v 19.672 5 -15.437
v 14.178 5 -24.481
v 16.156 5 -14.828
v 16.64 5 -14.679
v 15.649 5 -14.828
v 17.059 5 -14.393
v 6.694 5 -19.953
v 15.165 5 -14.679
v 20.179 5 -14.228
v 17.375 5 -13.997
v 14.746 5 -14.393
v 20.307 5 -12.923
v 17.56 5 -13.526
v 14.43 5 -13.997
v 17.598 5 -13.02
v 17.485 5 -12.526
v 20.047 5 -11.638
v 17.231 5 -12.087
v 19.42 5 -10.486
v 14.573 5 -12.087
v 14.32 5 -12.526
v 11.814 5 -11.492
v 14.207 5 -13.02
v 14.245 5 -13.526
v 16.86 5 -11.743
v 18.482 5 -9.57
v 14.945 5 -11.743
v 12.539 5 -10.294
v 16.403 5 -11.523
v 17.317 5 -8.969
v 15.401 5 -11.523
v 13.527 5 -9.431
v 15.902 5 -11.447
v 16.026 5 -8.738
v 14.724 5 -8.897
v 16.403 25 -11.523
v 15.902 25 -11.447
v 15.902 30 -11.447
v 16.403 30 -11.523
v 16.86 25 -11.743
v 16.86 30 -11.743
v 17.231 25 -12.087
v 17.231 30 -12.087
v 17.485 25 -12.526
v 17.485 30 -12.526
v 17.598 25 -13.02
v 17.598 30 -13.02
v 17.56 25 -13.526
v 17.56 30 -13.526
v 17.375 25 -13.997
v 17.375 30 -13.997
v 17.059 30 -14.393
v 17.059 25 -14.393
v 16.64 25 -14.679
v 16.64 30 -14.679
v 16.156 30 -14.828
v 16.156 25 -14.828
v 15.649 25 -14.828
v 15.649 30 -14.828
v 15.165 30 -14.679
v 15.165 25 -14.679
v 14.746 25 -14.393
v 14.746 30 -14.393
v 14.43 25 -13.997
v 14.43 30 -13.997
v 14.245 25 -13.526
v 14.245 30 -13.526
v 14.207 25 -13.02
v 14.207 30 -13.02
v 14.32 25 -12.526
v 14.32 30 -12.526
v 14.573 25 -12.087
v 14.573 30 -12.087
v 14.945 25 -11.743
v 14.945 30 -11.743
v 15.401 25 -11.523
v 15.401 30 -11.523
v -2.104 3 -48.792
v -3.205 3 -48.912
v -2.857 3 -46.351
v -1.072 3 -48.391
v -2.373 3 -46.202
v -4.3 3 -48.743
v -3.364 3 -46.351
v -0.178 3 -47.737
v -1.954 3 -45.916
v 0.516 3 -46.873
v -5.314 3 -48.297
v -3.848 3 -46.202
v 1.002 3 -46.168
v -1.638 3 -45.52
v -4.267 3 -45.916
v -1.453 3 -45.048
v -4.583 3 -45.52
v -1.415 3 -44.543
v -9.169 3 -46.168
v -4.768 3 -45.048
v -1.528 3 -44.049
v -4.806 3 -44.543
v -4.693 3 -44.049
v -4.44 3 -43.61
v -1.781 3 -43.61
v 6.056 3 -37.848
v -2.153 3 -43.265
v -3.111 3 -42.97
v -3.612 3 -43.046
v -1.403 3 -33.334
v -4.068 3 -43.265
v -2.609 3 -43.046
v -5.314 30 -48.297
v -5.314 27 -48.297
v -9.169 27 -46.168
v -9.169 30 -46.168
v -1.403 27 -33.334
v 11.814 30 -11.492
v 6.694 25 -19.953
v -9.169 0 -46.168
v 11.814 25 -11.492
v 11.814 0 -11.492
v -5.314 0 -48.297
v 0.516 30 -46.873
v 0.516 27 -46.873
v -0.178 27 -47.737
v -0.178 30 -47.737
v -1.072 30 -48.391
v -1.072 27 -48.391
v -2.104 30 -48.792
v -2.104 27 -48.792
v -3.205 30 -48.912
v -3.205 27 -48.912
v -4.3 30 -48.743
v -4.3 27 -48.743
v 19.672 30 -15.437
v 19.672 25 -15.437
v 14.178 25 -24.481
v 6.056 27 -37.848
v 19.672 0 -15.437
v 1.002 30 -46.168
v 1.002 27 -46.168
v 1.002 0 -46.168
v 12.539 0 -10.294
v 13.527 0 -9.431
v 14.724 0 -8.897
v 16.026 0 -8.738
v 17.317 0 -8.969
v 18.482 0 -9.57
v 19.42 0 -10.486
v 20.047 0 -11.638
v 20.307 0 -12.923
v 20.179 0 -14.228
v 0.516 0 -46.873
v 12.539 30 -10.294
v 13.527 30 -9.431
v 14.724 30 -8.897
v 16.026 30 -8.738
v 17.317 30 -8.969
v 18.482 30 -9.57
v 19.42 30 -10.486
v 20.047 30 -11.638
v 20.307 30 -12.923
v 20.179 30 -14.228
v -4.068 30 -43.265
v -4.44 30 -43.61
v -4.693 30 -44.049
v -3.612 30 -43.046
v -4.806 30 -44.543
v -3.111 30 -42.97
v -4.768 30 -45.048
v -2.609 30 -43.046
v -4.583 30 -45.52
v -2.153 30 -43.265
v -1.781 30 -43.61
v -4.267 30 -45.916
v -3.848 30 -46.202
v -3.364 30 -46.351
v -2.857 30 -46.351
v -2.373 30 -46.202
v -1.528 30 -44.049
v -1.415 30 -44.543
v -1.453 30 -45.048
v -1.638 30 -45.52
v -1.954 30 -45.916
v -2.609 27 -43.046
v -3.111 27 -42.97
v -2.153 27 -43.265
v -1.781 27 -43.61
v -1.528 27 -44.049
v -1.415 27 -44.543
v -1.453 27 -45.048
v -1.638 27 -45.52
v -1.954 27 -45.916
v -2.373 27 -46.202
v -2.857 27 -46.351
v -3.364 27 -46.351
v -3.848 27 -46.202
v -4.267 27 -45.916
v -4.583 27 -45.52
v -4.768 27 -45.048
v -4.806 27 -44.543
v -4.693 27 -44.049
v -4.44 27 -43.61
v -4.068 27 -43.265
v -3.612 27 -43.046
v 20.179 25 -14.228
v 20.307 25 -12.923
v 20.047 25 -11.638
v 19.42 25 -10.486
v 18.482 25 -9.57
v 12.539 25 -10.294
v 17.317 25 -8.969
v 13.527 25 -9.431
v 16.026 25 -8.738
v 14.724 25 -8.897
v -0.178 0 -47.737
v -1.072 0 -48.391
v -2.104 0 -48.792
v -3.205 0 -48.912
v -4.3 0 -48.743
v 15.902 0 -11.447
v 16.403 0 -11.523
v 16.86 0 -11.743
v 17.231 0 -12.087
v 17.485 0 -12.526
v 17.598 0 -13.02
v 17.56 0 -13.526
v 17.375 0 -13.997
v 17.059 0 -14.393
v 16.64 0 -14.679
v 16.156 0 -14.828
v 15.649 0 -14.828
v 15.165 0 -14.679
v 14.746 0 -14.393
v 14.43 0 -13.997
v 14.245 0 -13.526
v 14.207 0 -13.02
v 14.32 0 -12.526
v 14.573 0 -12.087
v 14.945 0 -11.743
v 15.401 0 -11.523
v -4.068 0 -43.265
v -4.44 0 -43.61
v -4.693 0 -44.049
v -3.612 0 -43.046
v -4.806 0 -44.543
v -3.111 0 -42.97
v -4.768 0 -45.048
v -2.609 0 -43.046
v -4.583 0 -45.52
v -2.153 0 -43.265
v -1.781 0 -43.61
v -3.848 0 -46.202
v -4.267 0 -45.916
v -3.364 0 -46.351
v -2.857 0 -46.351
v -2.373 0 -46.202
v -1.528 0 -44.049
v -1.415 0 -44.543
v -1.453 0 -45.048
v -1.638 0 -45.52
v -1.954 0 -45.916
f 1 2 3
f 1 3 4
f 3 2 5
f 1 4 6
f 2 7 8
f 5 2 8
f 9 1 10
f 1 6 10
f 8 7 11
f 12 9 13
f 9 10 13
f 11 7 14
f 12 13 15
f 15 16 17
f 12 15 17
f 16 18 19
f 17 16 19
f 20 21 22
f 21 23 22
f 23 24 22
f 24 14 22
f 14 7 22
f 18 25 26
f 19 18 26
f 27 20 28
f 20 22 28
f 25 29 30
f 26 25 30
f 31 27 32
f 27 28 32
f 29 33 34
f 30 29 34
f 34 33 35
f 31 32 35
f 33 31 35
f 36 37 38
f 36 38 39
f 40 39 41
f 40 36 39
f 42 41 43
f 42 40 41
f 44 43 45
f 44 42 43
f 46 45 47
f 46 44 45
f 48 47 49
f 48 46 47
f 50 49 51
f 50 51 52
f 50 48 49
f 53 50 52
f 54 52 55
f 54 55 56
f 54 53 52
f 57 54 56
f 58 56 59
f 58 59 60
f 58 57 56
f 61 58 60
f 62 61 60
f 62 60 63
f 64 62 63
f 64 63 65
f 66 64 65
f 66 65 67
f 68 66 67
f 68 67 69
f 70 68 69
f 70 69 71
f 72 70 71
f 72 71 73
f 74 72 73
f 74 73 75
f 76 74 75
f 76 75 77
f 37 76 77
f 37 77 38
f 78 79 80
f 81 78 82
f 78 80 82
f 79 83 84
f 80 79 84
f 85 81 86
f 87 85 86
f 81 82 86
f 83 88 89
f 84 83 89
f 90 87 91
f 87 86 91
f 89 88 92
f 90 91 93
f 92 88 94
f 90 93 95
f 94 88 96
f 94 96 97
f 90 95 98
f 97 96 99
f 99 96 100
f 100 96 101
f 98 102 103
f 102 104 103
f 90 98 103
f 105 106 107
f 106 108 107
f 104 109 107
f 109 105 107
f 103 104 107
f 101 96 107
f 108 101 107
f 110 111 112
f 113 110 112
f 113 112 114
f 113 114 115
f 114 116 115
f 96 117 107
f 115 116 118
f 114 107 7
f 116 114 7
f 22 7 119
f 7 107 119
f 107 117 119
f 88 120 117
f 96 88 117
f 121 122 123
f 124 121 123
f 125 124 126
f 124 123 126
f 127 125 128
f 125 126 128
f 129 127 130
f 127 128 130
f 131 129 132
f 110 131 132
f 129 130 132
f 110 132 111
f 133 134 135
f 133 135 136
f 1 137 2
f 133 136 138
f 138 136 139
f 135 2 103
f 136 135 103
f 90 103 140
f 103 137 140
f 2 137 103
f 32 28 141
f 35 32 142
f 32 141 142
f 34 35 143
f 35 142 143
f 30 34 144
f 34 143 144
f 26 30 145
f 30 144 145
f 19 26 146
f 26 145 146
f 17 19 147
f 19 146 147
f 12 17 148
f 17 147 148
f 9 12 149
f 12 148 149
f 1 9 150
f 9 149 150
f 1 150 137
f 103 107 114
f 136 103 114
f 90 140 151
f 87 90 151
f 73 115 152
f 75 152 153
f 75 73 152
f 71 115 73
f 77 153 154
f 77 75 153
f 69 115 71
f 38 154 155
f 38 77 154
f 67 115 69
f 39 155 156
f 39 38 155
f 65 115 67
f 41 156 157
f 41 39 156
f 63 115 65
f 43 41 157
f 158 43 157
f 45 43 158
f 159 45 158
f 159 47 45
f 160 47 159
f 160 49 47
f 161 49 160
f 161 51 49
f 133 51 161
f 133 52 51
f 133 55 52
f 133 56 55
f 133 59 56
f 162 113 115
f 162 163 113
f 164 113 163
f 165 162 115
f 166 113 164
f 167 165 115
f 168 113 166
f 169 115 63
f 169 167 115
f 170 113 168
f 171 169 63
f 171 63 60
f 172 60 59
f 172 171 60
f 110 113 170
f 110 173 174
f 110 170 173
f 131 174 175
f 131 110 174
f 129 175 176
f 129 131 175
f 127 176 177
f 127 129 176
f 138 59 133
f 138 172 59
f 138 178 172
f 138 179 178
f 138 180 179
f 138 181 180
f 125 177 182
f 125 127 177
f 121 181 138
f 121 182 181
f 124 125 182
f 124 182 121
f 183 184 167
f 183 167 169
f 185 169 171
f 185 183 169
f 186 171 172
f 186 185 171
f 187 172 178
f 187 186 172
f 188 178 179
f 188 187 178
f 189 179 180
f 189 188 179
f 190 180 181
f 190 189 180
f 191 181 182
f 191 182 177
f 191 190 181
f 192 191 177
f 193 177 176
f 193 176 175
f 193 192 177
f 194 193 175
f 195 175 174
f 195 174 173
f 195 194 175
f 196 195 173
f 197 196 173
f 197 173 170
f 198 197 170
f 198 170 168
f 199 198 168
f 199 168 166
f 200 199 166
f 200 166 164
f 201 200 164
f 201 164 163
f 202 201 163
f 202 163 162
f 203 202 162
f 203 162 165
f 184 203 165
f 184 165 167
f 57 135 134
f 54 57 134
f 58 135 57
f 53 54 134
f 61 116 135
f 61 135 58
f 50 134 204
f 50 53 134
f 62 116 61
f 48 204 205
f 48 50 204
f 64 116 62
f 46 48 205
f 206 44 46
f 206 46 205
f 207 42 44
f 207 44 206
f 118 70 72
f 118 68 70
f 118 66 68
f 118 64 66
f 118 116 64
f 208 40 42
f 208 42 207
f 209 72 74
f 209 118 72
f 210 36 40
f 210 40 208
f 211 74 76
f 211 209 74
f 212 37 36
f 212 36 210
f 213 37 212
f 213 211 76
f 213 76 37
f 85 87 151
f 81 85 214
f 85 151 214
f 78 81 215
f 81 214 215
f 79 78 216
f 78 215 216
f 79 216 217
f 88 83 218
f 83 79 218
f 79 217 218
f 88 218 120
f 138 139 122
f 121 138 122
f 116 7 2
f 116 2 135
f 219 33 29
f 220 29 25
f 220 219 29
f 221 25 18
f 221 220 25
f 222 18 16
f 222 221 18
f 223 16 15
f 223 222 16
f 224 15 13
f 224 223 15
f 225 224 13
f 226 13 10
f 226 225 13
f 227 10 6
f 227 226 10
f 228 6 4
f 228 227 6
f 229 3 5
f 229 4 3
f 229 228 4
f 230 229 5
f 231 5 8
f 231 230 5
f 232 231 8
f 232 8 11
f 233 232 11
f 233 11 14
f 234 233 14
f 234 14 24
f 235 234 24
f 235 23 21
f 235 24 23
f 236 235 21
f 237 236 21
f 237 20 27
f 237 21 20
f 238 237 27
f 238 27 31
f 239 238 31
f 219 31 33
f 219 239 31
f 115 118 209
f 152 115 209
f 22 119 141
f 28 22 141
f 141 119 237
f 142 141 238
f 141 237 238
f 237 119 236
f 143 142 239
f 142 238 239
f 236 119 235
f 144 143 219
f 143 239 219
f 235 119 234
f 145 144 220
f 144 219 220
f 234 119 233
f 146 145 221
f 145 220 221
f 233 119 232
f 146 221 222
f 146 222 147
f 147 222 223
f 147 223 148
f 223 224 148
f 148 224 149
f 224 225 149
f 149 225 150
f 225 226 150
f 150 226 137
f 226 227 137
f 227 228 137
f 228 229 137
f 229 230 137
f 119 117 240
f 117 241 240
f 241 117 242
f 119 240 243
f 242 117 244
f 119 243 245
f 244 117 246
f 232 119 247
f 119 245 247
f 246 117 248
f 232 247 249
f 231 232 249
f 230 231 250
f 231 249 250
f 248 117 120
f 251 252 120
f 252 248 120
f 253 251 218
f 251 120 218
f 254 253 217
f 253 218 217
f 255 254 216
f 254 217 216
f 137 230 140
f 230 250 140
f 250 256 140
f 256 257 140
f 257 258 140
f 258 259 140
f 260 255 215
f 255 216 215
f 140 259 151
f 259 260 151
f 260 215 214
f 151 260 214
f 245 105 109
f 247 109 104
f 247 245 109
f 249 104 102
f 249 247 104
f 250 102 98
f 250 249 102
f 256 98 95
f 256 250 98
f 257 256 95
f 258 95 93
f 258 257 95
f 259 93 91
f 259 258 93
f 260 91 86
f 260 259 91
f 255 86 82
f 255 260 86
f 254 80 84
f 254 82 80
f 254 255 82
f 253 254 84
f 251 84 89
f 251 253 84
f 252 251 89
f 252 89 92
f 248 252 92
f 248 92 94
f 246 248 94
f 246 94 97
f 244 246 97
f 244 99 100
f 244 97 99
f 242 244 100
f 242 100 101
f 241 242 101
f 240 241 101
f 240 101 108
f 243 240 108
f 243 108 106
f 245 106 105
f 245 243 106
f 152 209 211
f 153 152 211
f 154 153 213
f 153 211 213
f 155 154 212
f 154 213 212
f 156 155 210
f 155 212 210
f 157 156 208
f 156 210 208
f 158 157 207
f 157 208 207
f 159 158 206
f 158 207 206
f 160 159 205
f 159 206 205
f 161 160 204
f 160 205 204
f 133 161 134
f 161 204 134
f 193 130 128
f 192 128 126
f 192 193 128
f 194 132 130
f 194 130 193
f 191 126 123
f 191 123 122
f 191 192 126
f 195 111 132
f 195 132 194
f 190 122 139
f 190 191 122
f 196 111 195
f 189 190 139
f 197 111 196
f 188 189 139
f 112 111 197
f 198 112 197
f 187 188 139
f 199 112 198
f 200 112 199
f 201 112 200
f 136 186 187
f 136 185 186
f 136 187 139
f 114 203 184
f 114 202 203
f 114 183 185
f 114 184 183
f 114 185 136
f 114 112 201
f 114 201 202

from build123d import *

# Parameters (mm, degrees)
SKETCH1_R           = 1.7
BOSS_EXTRUDE3_DEPTH = 30
SKETCH3_W           = 15
SKETCH3_H           = 24
SKETCH3_H_2         = 20
CUT_EXTRUDE1_DEPTH  = 30


with BuildPart() as part:
    # Sketch1 → Boss-Extrude3 (new body)
    with BuildSketch(Plane(origin=(0, 0, 0), x_dir=(1, 0, 0), z_dir=(0, 1, 0))):
        with BuildLine():
            Line((-5.313882261, 48.296626618), (-9.168605584, 46.167598374))
            Line((-9.168605584, 46.167598374), (11.814117054, 11.491925283))
            Line((11.814117054, 11.491925283), (12.539193688, 10.293676573))
            ThreePointArc((12.539193688, 10.293676573), (18.482268259, 9.569826652), (19.671887971, 15.437441074))
            Line((19.671887971, 15.437441074), (1.001872335, 46.167598374))
            Line((1.001872335, 46.167598374), (0.516004793, 46.873367152))
            ThreePointArc((0.516004793, 46.873367152), (-2.104172047, 48.792406027), (-5.313882261, 48.296626618))
        make_face()
        with Locations(Location((15.902373856, 13.147283989, 0), (0, 0, 270))):
            Circle(SKETCH1_R, mode=Mode.SUBTRACT)
        with Locations(Location((-3.110568467, 44.670053358, 0), (0, 0, 270))):
            Circle(SKETCH1_R, mode=Mode.SUBTRACT)
    extrude(amount=BOSS_EXTRUDE3_DEPTH)

    # Sketch3 → Cut-Extrude1 (cut)
    with BuildSketch(Plane(origin=(13.737778319, 0, -8.312916994), x_dir=(0.5177090511258458, 0, 0.8555567417666561), z_dir=(-0.8555567417666561, 0, 0.5177090511258458))):
        with Locations((-36.745670137, 15)):
            Rectangle(SKETCH3_W, SKETCH3_H)
        with Locations((-6.104769326, 15)):
            Rectangle(SKETCH3_W, SKETCH3_H_2)
    extrude(amount=-CUT_EXTRUDE1_DEPTH, mode=Mode.SUBTRACT)


solid = part.part
